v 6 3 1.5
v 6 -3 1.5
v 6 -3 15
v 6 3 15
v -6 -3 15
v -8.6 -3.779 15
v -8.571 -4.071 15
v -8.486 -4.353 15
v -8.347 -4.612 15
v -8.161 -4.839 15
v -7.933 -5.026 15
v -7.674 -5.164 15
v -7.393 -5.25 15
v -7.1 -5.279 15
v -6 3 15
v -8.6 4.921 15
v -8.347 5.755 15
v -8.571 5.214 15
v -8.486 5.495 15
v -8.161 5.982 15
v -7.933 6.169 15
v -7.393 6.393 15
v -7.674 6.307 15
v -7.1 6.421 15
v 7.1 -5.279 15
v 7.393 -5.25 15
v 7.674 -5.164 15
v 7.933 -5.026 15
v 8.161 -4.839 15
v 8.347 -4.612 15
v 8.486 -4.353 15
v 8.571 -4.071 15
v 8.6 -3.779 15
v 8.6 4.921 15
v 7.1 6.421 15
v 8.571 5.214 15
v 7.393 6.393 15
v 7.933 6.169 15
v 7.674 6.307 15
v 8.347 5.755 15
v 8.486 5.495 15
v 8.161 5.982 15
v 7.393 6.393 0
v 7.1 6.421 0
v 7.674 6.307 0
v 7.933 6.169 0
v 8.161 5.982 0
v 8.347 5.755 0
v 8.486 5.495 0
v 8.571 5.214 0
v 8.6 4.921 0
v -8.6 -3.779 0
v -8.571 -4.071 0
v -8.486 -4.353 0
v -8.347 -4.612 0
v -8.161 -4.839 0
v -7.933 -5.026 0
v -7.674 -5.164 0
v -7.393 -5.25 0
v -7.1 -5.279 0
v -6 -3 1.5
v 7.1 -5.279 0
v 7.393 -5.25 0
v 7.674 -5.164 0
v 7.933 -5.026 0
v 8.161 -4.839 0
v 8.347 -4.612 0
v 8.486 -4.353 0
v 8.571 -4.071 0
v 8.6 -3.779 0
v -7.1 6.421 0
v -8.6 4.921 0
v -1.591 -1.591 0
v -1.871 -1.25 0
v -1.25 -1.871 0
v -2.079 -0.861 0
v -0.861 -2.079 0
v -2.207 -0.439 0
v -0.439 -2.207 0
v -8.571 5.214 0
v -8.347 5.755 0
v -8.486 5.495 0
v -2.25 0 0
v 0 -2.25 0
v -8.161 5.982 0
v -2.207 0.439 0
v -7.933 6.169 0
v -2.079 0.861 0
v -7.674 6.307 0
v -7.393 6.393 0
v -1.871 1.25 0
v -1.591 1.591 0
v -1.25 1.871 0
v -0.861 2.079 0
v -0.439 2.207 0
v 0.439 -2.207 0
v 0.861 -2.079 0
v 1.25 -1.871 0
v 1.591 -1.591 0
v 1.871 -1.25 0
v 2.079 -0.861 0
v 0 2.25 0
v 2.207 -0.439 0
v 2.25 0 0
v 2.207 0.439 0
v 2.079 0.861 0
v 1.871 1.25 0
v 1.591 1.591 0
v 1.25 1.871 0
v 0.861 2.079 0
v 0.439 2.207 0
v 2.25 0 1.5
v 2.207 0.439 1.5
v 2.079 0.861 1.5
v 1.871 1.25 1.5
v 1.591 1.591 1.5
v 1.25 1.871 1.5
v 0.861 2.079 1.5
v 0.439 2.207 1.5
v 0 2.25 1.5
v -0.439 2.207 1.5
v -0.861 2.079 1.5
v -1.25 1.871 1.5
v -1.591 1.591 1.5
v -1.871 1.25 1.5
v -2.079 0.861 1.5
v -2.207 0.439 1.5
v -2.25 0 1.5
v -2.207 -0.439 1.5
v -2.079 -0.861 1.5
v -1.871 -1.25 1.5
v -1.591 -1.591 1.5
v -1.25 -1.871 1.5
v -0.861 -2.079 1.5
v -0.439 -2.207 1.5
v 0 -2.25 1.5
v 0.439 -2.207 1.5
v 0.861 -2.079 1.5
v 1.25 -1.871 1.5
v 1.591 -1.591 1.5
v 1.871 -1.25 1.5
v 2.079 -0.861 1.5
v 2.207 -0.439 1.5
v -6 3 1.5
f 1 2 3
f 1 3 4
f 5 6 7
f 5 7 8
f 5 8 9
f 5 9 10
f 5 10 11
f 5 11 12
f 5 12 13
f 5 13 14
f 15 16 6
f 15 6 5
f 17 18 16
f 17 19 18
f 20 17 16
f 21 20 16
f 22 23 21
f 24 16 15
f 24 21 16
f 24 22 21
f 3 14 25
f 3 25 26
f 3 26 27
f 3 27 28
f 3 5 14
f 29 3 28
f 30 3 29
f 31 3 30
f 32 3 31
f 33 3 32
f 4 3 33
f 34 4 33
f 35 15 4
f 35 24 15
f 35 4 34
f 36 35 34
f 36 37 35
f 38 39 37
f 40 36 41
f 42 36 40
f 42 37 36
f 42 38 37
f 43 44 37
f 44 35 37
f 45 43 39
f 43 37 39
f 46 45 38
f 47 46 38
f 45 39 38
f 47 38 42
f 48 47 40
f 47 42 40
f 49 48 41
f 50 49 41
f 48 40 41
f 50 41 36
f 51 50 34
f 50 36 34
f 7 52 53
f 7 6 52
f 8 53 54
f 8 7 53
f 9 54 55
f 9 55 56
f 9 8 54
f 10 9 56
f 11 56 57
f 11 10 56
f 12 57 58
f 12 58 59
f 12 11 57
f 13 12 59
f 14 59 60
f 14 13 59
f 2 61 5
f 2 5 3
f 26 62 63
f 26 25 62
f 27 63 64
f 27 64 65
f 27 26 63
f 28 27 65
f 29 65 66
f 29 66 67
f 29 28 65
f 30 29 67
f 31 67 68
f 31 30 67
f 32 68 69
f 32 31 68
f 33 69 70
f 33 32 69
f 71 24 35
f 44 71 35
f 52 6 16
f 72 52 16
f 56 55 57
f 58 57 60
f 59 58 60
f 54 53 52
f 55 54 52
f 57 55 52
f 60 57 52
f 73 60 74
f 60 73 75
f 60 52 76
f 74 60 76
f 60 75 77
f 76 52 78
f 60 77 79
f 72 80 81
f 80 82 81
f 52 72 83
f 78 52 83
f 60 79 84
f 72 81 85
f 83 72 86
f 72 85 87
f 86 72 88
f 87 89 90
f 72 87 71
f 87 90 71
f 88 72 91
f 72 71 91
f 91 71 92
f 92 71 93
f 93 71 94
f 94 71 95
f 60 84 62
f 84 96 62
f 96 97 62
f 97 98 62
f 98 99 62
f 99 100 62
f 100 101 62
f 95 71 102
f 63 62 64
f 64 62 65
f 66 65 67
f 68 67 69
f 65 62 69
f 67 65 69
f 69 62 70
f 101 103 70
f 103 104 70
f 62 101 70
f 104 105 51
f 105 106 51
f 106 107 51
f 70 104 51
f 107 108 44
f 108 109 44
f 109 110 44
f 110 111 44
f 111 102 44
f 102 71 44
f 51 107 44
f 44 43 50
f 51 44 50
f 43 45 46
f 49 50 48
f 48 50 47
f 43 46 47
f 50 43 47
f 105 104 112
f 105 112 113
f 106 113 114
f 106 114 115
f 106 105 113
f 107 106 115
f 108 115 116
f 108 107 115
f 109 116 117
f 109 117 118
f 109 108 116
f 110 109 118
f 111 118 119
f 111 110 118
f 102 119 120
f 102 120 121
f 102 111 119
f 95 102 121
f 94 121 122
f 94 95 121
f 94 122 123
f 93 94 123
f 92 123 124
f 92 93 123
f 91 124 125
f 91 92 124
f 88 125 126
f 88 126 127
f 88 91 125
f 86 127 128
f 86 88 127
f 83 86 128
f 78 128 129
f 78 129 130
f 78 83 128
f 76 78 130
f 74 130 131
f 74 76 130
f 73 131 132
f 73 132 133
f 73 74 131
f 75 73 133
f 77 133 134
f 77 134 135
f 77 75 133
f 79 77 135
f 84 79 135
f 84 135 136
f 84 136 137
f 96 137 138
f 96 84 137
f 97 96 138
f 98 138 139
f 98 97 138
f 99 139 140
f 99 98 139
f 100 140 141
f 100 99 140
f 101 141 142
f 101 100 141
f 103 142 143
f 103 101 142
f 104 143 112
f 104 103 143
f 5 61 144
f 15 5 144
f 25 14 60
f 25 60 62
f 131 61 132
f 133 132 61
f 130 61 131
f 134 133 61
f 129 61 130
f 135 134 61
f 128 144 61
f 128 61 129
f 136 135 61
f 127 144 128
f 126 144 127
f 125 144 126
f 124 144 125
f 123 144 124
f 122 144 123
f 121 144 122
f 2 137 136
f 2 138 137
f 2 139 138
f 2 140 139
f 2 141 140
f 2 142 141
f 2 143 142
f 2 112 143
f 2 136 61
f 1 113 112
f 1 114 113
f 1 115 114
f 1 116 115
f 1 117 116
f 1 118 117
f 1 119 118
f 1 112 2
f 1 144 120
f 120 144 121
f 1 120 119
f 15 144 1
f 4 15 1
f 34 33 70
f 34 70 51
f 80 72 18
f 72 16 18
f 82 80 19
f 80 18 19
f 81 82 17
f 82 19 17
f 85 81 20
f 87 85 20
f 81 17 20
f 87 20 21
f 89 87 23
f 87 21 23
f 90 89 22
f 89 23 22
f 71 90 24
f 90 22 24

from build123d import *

# Parameters (mm, degrees)
F0_W     = 17.2
F0_H     = 11.7
F0_W_2   = 12
F0_H_2   = 6
F1_DEPTH = 15
F2_R     = 1.5
F0_R     = 2.25
F3_DEPTH = 1.5


# Not quite as in the source:
# - a feature names something its author has since deleted; it is built from what else it names


with BuildPart() as f1:
    # F0 (on Top) → F1 (new body)
    with BuildSketch(Plane.XY):
        with Locations((0, 0.571324781)):
            Rectangle(F0_W, F0_H)
        Rectangle(F0_W_2, F0_H_2, mode=Mode.SUBTRACT)
    extrude(amount=F1_DEPTH)

    # F2
    f2_edges = [f1.edges().sort_by_distance(p)[0] for p in [
        (-8.6, 6.421325, 7.5),
        (8.6, 6.421325, 7.5),
        (8.6, -5.278675, 7.5),
        (-8.6, -5.278675, 7.5),
    ]]
    fillet(f2_edges, radius=F2_R)

    # F0 (on Top) → F3 (join)
    with BuildSketch(Plane.XY):
        Rectangle(F0_W_2, F0_H_2)
        Circle(F0_R, mode=Mode.SUBTRACT)
    extrude(amount=F3_DEPTH)


solid = f1.part
